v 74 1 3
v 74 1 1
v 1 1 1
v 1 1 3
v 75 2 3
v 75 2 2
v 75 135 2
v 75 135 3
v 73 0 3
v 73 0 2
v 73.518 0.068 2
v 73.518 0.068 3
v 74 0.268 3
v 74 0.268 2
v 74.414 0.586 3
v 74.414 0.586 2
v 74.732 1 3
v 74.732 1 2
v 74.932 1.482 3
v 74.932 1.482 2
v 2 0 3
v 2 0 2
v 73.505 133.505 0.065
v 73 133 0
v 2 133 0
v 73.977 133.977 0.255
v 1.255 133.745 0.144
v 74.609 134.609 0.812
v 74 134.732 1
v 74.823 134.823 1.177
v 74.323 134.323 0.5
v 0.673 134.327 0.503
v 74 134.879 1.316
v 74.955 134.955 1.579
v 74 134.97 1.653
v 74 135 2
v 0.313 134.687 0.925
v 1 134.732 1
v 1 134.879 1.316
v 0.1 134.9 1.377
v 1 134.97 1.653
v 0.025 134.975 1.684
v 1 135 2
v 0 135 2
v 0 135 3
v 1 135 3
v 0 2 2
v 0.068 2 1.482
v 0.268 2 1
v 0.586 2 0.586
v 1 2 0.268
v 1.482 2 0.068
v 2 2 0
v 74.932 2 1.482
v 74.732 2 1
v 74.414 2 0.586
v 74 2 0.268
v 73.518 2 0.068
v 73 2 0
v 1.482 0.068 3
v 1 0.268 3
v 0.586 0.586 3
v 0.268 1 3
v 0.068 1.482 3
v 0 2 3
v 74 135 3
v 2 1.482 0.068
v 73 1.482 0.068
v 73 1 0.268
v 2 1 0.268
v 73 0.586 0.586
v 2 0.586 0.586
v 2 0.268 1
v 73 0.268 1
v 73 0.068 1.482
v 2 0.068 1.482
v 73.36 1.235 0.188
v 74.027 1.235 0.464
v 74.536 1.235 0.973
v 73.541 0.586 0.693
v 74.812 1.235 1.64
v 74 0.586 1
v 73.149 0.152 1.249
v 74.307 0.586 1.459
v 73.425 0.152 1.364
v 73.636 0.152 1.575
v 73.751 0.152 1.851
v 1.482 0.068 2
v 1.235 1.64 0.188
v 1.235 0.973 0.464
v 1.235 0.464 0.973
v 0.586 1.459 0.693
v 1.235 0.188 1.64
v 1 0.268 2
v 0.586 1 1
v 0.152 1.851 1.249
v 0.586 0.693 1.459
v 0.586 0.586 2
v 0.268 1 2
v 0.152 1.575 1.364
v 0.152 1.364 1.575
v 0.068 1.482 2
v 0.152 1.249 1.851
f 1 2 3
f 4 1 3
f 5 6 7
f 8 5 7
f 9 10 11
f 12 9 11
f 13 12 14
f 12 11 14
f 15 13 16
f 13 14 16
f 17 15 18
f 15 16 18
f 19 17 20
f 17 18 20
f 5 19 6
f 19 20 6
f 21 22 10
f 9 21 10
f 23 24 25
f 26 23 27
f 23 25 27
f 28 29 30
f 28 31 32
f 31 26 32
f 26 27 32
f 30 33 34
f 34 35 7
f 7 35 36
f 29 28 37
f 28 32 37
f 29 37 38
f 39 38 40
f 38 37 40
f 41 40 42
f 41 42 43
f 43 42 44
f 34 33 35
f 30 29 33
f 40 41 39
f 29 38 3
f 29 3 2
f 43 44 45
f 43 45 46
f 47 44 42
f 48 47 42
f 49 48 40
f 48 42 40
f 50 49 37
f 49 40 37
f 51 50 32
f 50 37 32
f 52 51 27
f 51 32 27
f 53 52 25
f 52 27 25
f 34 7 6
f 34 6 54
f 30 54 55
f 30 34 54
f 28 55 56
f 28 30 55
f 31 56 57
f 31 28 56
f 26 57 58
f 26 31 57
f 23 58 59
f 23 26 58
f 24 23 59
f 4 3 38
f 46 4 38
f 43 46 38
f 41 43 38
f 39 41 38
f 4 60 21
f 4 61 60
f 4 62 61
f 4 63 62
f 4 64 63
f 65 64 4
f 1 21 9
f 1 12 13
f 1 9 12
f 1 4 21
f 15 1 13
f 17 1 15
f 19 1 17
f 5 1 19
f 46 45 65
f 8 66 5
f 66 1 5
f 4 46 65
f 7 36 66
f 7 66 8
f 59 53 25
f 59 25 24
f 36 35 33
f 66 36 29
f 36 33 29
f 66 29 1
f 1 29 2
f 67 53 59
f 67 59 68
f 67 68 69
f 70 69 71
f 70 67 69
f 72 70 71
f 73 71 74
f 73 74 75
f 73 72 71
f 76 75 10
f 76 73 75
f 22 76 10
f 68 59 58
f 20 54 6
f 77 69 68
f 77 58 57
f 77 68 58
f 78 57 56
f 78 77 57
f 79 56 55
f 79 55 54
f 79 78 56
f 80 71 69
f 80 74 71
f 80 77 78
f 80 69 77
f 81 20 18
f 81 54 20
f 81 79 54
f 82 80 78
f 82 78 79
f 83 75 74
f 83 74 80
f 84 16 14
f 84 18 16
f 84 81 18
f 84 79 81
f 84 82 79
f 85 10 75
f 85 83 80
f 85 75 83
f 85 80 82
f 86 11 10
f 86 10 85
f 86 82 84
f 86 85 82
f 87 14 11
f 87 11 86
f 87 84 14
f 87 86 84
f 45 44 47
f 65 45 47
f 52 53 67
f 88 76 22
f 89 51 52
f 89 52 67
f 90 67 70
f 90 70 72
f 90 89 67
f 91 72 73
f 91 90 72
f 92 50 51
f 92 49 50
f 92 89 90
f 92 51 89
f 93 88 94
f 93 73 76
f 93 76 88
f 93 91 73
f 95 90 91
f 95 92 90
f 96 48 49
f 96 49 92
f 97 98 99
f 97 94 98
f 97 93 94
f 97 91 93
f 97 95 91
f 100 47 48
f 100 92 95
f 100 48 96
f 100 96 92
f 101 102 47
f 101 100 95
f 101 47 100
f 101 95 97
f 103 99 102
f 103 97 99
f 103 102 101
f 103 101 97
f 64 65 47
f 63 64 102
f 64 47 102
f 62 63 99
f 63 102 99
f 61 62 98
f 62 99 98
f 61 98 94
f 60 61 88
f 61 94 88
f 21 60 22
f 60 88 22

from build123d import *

# Parameters (mm, degrees)
F1_DEPTH     = 3
F0_W         = 73
F0_H         = 134
F2_DEPTH     = 1
F3_T1_DEPTH  = 145
F3_T3_DEPTH  = 85
F4_T1_DEPTH  = 6
F4_S5_W      = 2
F4_S5_H      = 2
F4_T6_DEPTH  = 2
F4_S11_W     = 2
F4_S11_H     = 2
F4_T12_DEPTH = 2


# Not quite as in the source:
# - a fillet or chamfer that OpenCascade refuses, or shapes differently, is made with other operations: its cross-section is extruded or revolved along the edge and cut away or added


with BuildPart() as f1:
    # F0 (on Top) → F1 (new body)
    with BuildSketch(Plane.XY):
        Polygon((0, 135), (0, 0), (75, 0), (75, 135), (74, 135), (74, 1), (1, 1), (1, 135), align=None)
    extrude(amount=F1_DEPTH)

    # F0 (on Top) → F2 (join)
    with BuildSketch(Plane.XY):
        with Locations((37.5, 68)):
            Rectangle(F0_W, F0_H)
    extrude(amount=F2_DEPTH)

    # F3: fillet of radius 2 on 4 edges, made by hand

    # F3_s2 → F3_t1 (cut)
    with BuildSketch(Plane.XZ.offset(-140)):
        with BuildLine():
            ThreePointArc((0, 2), (0.5857864376, 0.5857864376), (2, 0))
            Line((2, 0), (0, 0))
            Line((0, 0), (0, 2))
        make_face()
        with BuildLine():
            ThreePointArc((75, 2), (74.4142135624, 0.5857864376), (73, 0))
            Line((73, 0), (75, 0))
            Line((75, 0), (75, 2))
        make_face()
    extrude(amount=F3_T1_DEPTH, mode=Mode.SUBTRACT)

    # F3_s4 → F3_t3 (cut)
    with BuildSketch(Plane.YZ.offset(-5)):
        with BuildLine():
            ThreePointArc((2, 0), (0.5857864376, 0.5857864376), (0, 2))
            Line((0, 2), (0, 0))
            Line((0, 0), (2, 0))
        make_face()
        with BuildLine():
            ThreePointArc((133, 0), (134.4142135624, 0.5857864376), (135, 2))
            Line((135, 2), (135, 0))
            Line((135, 0), (133, 0))
        make_face()
    extrude(amount=F3_T3_DEPTH, mode=Mode.SUBTRACT)

    # F4: fillet of radius 2 on 2 edges, made by hand

    # F4_s2 → F4_t1 (cut)
    with BuildSketch(Plane.XY.offset(2)):
        with BuildLine():
            ThreePointArc((73, 0), (74.4142135624, 0.5857864376), (75, 2))
            Line((75, 2), (75, 0))
            Line((75, 0), (73, 0))
        make_face()
        with BuildLine():
            ThreePointArc((0, 2), (0.5857864376, 0.5857864376), (2, 0))
            Line((2, 0), (0, 0))
            Line((0, 0), (0, 2))
        make_face()
    extrude(amount=F4_T1_DEPTH, mode=Mode.SUBTRACT)


with BuildPart() as f4_tool4:
    # F4_s5 → F4_t6 (new body)
    with BuildSketch(Plane.YZ.offset(2)):
        with Locations((1, 1)):
            Rectangle(F4_S5_W, F4_S5_H)
    extrude(amount=-F4_T6_DEPTH)

    # F4_s7 → F4_t8 (revolve, cut)
    with BuildSketch(Plane(origin=(2, 2, 2), x_dir=(0, 0.7071067812, 0.7071067812), z_dir=(0, -0.7071067812, 0.7071067812))):
        with BuildLine():
            ThreePointArc((0, -2), (2, 0), (0, 2))
            Line((0, 2), (0, -2))
        make_face()
    revolve(axis=Axis((2, 2, 2), (-1, 0, 0)), mode=Mode.SUBTRACT)


with BuildPart() as f1_1:
    add(f1.part)

    # F4_t3: cut F4_tool4
    add(f4_tool4.part, mode=Mode.SUBTRACT)


with BuildPart() as f4_tool10:
    # F4_s11 → F4_t12 (new body)
    with BuildSketch(Plane.XZ.offset(-2)):
        with Locations((74, 1)):
            Rectangle(F4_S11_W, F4_S11_H)
    extrude(amount=F4_T12_DEPTH)

    # F4_s13 → F4_t14 (revolve, cut)
    with BuildSketch(Plane(origin=(73, 2, 2), x_dir=(-0.7071067812, 0, 0.7071067812), z_dir=(0.7071067812, 0, 0.7071067812))):
        with BuildLine():
            ThreePointArc((0, -2), (2, 0), (0, 2))
            Line((0, 2), (0, -2))
        make_face()
    revolve(axis=Axis((73, 2, 2), (0, -1, 0)), mode=Mode.SUBTRACT)


with BuildPart() as f1_2:
    add(f1_1.part)

    # F4_t9: cut F4_tool10
    add(f4_tool10.part, mode=Mode.SUBTRACT)


solid = f1_2.part
